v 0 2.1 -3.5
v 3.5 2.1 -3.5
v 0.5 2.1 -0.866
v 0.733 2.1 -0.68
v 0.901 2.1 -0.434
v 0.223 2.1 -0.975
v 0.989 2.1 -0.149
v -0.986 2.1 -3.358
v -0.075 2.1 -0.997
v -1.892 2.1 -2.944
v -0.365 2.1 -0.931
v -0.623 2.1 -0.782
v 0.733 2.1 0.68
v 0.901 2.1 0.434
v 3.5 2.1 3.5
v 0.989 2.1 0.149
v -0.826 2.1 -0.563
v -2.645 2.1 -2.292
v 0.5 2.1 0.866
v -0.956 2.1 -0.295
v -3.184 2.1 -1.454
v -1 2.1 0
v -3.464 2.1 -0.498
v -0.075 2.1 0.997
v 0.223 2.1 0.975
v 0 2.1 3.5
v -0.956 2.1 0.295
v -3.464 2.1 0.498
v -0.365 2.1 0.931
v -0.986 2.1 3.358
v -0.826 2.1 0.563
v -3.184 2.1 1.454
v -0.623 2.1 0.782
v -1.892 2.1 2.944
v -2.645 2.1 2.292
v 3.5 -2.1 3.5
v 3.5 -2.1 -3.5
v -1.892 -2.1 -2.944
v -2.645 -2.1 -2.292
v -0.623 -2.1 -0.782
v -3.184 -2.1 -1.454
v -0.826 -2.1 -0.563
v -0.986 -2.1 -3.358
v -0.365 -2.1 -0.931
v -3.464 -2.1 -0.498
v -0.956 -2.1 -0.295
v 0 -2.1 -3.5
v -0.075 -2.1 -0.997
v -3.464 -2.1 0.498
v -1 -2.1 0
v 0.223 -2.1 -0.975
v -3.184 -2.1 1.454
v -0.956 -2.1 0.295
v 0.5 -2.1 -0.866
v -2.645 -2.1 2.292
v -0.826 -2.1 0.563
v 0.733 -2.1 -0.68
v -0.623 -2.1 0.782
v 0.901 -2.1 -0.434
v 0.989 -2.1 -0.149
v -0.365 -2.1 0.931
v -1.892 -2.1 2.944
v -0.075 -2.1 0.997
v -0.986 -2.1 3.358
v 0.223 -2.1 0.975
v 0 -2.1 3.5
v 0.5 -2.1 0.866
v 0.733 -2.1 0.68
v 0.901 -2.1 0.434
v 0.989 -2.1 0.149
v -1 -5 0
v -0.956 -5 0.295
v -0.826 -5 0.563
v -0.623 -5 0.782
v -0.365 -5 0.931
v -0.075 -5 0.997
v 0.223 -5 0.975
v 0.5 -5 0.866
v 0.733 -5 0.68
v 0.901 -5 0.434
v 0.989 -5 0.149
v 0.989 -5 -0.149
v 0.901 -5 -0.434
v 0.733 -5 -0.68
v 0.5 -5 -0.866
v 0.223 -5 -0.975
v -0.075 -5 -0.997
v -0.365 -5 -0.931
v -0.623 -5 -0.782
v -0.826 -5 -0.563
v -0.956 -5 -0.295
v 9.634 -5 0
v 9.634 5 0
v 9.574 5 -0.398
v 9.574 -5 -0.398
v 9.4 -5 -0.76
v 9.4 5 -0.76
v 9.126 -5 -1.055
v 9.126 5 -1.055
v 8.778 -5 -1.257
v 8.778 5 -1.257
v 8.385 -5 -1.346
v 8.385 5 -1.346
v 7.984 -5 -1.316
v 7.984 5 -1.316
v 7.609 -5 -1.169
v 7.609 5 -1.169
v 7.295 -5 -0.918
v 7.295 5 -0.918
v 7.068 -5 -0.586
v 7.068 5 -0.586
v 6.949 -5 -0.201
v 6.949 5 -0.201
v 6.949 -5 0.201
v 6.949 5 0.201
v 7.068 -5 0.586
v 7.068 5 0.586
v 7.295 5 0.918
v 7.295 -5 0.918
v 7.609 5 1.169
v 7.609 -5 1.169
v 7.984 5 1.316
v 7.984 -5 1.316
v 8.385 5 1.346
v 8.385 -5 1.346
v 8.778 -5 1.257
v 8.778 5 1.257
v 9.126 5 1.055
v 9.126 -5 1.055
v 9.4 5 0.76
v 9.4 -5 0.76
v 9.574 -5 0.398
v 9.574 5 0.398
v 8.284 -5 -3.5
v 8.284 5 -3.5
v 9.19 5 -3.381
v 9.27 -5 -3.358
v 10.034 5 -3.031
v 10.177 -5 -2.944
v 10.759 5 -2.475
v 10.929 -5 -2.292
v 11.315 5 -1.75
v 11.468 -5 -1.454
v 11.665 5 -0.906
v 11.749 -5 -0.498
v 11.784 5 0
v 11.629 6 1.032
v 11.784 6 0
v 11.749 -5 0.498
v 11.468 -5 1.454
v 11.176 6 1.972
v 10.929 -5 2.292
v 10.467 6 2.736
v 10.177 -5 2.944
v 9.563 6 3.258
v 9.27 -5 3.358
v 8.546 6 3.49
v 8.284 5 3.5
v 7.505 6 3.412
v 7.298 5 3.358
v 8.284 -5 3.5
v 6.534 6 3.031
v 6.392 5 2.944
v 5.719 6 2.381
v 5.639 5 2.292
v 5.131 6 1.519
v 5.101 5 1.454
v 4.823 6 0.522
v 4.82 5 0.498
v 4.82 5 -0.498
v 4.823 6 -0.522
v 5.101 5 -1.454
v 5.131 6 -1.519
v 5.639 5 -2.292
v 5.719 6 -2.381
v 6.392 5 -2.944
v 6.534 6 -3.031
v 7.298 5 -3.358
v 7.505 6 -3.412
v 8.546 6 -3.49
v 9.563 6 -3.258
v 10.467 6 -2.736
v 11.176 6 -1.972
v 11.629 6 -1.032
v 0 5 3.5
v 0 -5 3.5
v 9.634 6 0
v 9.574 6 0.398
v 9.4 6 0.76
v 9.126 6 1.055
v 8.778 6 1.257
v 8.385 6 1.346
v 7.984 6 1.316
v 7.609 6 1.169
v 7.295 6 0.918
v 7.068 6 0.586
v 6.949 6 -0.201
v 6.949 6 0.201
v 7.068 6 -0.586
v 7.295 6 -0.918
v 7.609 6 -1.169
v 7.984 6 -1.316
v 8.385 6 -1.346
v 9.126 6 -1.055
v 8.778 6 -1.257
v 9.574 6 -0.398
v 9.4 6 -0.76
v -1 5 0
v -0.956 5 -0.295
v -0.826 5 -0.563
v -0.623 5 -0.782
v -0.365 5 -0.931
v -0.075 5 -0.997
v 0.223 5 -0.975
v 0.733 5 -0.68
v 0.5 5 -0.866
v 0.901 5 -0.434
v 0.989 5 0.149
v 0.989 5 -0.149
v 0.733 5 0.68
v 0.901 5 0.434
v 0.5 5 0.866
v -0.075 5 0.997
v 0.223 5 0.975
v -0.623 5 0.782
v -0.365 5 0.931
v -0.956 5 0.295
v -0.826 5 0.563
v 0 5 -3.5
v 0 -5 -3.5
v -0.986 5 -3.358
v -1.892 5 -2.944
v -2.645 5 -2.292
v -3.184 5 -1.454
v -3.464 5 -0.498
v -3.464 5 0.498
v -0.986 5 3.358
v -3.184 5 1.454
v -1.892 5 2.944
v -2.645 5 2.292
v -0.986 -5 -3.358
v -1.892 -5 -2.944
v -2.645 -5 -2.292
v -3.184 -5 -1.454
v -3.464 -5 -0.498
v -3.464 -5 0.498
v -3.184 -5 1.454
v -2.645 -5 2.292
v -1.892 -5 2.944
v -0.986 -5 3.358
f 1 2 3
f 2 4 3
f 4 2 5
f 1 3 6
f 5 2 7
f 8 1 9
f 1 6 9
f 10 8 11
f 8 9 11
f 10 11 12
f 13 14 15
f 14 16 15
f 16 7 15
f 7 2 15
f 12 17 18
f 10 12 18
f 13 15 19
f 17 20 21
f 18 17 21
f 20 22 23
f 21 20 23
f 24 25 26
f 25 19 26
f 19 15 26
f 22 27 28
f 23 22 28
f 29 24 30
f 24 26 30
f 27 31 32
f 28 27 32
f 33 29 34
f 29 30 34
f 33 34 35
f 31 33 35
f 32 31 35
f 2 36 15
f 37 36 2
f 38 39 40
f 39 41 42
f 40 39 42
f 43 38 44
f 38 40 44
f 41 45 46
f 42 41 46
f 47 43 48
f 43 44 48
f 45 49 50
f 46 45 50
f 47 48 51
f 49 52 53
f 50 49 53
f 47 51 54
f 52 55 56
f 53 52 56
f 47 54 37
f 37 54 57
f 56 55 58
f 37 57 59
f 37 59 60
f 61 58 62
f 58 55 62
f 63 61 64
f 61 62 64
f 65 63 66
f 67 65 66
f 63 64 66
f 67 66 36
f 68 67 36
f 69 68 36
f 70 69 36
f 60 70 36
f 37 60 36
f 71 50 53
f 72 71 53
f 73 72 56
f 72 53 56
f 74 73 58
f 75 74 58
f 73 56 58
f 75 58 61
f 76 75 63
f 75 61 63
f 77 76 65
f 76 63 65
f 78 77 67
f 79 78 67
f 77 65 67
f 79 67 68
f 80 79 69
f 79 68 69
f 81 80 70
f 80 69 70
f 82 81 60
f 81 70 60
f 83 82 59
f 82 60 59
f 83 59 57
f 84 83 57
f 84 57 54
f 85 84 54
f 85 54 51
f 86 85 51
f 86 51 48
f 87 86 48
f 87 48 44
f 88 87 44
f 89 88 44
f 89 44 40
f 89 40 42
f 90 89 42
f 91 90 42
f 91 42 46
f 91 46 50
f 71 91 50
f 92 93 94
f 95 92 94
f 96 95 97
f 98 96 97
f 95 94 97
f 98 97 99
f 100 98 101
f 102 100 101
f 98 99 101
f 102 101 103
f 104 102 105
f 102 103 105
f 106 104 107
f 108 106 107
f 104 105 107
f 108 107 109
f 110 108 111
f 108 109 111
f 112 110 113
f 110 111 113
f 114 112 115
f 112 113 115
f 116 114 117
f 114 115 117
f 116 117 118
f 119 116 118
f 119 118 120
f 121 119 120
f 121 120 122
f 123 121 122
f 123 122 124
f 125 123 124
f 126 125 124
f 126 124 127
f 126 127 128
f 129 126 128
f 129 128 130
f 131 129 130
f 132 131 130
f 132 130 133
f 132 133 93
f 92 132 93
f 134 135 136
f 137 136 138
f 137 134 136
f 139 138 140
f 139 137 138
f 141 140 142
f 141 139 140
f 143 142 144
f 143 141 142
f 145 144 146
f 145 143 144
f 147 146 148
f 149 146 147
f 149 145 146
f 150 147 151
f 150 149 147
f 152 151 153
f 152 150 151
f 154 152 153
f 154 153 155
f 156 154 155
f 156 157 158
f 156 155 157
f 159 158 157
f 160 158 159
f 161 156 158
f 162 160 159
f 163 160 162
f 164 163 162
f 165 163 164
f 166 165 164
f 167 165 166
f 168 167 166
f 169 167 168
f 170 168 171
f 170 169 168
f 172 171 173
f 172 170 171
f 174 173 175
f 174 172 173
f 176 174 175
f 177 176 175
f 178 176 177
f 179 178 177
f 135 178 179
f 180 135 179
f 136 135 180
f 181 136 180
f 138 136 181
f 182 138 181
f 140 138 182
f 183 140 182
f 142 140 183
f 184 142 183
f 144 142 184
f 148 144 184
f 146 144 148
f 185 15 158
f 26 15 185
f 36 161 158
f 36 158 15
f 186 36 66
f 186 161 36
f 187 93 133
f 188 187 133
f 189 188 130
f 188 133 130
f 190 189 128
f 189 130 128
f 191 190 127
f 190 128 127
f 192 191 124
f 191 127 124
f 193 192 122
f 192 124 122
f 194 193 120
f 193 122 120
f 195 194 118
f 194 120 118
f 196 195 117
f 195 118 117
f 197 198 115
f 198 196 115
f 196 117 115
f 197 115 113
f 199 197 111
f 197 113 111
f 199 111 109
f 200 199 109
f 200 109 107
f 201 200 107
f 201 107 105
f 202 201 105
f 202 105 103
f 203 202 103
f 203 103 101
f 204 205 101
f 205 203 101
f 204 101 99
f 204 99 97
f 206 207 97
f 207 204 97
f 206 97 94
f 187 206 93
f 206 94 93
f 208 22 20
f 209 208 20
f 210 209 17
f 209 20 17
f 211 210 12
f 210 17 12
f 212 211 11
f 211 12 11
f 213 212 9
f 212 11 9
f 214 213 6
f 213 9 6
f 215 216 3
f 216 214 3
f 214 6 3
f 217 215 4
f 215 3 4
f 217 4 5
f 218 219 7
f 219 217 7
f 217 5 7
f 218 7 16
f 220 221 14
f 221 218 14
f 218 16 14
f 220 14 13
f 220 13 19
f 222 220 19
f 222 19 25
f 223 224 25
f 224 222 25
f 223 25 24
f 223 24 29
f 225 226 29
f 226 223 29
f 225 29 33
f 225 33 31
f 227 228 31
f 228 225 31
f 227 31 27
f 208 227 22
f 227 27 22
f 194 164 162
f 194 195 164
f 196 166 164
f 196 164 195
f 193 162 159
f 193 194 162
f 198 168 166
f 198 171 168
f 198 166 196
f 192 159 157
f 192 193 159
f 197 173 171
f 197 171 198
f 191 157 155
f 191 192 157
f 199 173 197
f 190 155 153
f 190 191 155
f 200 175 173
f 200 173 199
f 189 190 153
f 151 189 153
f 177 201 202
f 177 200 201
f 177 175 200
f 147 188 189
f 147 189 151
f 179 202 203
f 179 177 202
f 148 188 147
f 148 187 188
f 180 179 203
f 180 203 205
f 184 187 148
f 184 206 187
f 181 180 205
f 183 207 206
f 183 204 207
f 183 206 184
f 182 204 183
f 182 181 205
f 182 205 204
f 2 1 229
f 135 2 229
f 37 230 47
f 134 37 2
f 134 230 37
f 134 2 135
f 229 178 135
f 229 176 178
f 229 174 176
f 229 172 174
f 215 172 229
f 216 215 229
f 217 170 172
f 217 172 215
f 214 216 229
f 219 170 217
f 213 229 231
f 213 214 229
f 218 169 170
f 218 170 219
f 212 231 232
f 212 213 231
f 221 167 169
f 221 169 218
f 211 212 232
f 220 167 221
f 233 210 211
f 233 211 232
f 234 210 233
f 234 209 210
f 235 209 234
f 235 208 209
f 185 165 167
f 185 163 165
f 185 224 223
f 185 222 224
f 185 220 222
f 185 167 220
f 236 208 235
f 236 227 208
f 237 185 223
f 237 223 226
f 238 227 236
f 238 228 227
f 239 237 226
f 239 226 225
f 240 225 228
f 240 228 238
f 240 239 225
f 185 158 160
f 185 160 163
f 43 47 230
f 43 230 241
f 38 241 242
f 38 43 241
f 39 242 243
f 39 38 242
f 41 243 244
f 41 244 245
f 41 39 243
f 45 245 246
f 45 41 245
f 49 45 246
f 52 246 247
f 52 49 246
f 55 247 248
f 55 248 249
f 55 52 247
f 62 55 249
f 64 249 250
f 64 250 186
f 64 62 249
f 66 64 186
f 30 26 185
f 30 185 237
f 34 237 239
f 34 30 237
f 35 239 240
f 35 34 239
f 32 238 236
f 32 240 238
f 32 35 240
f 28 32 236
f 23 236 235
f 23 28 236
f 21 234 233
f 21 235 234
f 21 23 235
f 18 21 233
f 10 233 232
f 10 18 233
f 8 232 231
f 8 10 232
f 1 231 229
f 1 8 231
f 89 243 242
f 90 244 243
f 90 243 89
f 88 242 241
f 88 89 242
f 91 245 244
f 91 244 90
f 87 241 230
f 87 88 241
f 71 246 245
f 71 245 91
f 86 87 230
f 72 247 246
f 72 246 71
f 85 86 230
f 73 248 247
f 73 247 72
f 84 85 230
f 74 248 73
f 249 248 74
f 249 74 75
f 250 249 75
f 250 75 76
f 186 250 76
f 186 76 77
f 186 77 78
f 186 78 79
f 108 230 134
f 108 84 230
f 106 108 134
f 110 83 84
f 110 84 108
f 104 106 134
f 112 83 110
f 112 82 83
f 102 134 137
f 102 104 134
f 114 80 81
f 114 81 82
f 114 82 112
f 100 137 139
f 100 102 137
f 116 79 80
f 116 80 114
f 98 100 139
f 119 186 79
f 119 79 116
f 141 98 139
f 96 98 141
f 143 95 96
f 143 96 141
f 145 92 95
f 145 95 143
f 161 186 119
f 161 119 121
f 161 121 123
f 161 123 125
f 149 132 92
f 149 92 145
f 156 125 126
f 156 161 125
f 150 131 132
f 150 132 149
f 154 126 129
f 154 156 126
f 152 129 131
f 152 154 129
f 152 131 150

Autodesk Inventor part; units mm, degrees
ref_plane "YZ Plane" through (0, 0, 0) normal (1, 0, 0) x (0, 1, 0)
ref_plane "XZ Plane" through (0, 0, 0) normal (0, 1, 0) x (-1, 0, 0)
ref_plane "XY Plane" through (0, 0, 0) normal (0, 0, 1) x (1, 0, 0)
sketch "スケッチ1" plane through (0, 0, 0) normal (0, 1, 0) x (-1, 0, 0)
  circle A0 centre (0, 0) radius 1
  circle A1 centre (0, 0) radius 3.5
  circle A2 centre (-8.2843, 0) radius 3.5
  line L0 (0, -3.5) -> (-8.2843, -3.5)
  line L1 (-8.2843, -3.5) -> (-8.2843, 3.5) construction
  line L2 (-8.2843, 3.5) -> (0, 3.5)
  line L3 (0, 3.5) -> (0, -3.5) construction
  circle A3 centre (-8.2843, 0) radius 1
  line L4 (-3.5, -3.5) -> (-4.7843, -3.5)
  line L5 (-4.7843, -3.5) -> (-4.7843, 3.5)
  line L6 (-4.7843, 3.5) -> (-3.5, 3.5)
  line L7 (-3.5, 3.5) -> (-3.5, -3.5)
  circle A4 centre (-4.1421, 10) radius 10
  line L8 (0, 0) -> (-8.2843, 0)
  line L9 (-4.1421, 10) -> (0, 0)
  line L10 (-4.1421, 10) -> (-8.2843, 0)
  point P0 (-8.2843, -3.5)
  point P1 (-4.7843, -3.5)
  point P2 (-4.1421, 0)
  dimension "d1" = 7
  dimension "d0" = 2
  dimension "d13" = 20
  dimension "d14" = 45
extrude "押し出し3" add sketch "スケッチ1" along normal blind 5 contours A0 A4 A1 L8 | A0 L9 A1 A4 | L8 A4 A0 | A0 A4 A1 L9 | L7 L2 L9 A1 | A4 L5 L2 L7 | A1 L0 L7 | L7 L0 L5 L8 A4 | L9 L2 A1 | L8 A2 A4 | A4 A3 L8 A2 | A2 L10 A3 A4 | L5 A2 L10 L2 | L0 A2 L5 | A4 A3 L10 A2 | A2 L8 A3 A4 | L2 L10 A2
extrude "押し出し4" cut sketch "スケッチ1" along normal blind 2.1 contours A0 A4 A1 L8 | A0 L9 A1 A4 | L8 A4 A0 | A0 A4 A1 L9 | L7 L2 L9 A1 | A1 L0 L7 | L9 L2 A1 | A4 A3 L8 A2 | A2 L10 A3 A4 | L5 A2 L10 L2 | L0 A2 L5 | A4 A3 L10 A2 | A2 L8 A3 A4 | L2 L10 A2
mirror "ミラー2" about plane through (4.1421, 0, 0) normal (0, -1, 0)
sketch "スケッチ3" plane through (0, 5, 0) normal (0, 1, 0) x (1, 0, 0)
  circle A0 centre (14.2843, 0) radius 1.35
  line L0 (4.7843, -3.5) -> (8.2843, -3.5) projected
  line L1 (8.2843, -3.5) -> (17.7843, -3.5)
  line L2 (17.7843, -3.5) -> (17.7843, 3.5)
  line L3 (17.7843, 3.5) -> (8.2843, 3.5)
  line L4 (8.2843, 3.5) -> (8.2843, -3.5)
  line L5 (8.2843, 3.5) -> (0, 3.5) projected
  circle A1 centre (14.2843, 0) radius 3.5
  line L6 (4.7843, -3.5) -> (8.2843, -3.5) projected
  line L7 (4.7843, 3.5) -> (4.7843, -3.5) projected
  line L8 (8.2843, 3.5) -> (4.7843, 3.5) projected
  arc A2 (8.2843, -3.5) -> (8.2843, 3.5) centre (8.2843, 0) ccw projected
  circle A3 centre (8.2843, 0) radius 1 projected
  point P0 (0, 0)
  point P1 (8.2843, 0)
  point P2 (14.2843, -3.5)
  point P3 (14.2843, 3.5)
  dimension "d15" = 2.7
  dimension "d16" = 6
extrude "押し出し5" add sketch "スケッチ3" against normal up to surface (10 mm away) contours L7 L5 L4 A3 L0 | L4 A3 A2 A1 | A1 A2 picked at (11.1245, 0.126)
sketch "スケッチ4" plane through (0, 5, 0) normal (0, 1, 0) x (1, 0, 0)
  circle A0 centre (8.2843, 0) radius 1 projected
  circle A1 centre (8.2843, 0) radius 1.35
  point P0 (0, 0)
  dimension "d20" = 2.7
extrude "押し出し6" cut sketch "スケッチ4" against normal through all contours A0 | A1
sketch "スケッチ5" plane through (0, 5, 0) normal (0, 1, 0) x (1, 0, 0)
  circle A0 centre (8.2843, 0) radius 1.35 projected
  circle A1 centre (0, 0) radius 1 projected
  arc A2 (0, 3.5) -> (0, -3.5) centre (0, 0) ccw projected
  line L0 (0, -3.5) -> (8.2843, -3.5) projected
  circle A3 centre (8.2843, 0) radius 3.5
  line L1 (8.2843, 3.5) -> (0, 3.5) projected
  arc A4 (8.2843, -3.5) -> (8.2843, 3.5) centre (8.2843, 0) ccw projected
  point P0 (8.2843, -3.5)
  point P1 (8.2843, -3.5)
extrude "押し出し7" add sketch "スケッチ5" along normal blind 1 contours A3
properties part number "chain_fork_connector"
